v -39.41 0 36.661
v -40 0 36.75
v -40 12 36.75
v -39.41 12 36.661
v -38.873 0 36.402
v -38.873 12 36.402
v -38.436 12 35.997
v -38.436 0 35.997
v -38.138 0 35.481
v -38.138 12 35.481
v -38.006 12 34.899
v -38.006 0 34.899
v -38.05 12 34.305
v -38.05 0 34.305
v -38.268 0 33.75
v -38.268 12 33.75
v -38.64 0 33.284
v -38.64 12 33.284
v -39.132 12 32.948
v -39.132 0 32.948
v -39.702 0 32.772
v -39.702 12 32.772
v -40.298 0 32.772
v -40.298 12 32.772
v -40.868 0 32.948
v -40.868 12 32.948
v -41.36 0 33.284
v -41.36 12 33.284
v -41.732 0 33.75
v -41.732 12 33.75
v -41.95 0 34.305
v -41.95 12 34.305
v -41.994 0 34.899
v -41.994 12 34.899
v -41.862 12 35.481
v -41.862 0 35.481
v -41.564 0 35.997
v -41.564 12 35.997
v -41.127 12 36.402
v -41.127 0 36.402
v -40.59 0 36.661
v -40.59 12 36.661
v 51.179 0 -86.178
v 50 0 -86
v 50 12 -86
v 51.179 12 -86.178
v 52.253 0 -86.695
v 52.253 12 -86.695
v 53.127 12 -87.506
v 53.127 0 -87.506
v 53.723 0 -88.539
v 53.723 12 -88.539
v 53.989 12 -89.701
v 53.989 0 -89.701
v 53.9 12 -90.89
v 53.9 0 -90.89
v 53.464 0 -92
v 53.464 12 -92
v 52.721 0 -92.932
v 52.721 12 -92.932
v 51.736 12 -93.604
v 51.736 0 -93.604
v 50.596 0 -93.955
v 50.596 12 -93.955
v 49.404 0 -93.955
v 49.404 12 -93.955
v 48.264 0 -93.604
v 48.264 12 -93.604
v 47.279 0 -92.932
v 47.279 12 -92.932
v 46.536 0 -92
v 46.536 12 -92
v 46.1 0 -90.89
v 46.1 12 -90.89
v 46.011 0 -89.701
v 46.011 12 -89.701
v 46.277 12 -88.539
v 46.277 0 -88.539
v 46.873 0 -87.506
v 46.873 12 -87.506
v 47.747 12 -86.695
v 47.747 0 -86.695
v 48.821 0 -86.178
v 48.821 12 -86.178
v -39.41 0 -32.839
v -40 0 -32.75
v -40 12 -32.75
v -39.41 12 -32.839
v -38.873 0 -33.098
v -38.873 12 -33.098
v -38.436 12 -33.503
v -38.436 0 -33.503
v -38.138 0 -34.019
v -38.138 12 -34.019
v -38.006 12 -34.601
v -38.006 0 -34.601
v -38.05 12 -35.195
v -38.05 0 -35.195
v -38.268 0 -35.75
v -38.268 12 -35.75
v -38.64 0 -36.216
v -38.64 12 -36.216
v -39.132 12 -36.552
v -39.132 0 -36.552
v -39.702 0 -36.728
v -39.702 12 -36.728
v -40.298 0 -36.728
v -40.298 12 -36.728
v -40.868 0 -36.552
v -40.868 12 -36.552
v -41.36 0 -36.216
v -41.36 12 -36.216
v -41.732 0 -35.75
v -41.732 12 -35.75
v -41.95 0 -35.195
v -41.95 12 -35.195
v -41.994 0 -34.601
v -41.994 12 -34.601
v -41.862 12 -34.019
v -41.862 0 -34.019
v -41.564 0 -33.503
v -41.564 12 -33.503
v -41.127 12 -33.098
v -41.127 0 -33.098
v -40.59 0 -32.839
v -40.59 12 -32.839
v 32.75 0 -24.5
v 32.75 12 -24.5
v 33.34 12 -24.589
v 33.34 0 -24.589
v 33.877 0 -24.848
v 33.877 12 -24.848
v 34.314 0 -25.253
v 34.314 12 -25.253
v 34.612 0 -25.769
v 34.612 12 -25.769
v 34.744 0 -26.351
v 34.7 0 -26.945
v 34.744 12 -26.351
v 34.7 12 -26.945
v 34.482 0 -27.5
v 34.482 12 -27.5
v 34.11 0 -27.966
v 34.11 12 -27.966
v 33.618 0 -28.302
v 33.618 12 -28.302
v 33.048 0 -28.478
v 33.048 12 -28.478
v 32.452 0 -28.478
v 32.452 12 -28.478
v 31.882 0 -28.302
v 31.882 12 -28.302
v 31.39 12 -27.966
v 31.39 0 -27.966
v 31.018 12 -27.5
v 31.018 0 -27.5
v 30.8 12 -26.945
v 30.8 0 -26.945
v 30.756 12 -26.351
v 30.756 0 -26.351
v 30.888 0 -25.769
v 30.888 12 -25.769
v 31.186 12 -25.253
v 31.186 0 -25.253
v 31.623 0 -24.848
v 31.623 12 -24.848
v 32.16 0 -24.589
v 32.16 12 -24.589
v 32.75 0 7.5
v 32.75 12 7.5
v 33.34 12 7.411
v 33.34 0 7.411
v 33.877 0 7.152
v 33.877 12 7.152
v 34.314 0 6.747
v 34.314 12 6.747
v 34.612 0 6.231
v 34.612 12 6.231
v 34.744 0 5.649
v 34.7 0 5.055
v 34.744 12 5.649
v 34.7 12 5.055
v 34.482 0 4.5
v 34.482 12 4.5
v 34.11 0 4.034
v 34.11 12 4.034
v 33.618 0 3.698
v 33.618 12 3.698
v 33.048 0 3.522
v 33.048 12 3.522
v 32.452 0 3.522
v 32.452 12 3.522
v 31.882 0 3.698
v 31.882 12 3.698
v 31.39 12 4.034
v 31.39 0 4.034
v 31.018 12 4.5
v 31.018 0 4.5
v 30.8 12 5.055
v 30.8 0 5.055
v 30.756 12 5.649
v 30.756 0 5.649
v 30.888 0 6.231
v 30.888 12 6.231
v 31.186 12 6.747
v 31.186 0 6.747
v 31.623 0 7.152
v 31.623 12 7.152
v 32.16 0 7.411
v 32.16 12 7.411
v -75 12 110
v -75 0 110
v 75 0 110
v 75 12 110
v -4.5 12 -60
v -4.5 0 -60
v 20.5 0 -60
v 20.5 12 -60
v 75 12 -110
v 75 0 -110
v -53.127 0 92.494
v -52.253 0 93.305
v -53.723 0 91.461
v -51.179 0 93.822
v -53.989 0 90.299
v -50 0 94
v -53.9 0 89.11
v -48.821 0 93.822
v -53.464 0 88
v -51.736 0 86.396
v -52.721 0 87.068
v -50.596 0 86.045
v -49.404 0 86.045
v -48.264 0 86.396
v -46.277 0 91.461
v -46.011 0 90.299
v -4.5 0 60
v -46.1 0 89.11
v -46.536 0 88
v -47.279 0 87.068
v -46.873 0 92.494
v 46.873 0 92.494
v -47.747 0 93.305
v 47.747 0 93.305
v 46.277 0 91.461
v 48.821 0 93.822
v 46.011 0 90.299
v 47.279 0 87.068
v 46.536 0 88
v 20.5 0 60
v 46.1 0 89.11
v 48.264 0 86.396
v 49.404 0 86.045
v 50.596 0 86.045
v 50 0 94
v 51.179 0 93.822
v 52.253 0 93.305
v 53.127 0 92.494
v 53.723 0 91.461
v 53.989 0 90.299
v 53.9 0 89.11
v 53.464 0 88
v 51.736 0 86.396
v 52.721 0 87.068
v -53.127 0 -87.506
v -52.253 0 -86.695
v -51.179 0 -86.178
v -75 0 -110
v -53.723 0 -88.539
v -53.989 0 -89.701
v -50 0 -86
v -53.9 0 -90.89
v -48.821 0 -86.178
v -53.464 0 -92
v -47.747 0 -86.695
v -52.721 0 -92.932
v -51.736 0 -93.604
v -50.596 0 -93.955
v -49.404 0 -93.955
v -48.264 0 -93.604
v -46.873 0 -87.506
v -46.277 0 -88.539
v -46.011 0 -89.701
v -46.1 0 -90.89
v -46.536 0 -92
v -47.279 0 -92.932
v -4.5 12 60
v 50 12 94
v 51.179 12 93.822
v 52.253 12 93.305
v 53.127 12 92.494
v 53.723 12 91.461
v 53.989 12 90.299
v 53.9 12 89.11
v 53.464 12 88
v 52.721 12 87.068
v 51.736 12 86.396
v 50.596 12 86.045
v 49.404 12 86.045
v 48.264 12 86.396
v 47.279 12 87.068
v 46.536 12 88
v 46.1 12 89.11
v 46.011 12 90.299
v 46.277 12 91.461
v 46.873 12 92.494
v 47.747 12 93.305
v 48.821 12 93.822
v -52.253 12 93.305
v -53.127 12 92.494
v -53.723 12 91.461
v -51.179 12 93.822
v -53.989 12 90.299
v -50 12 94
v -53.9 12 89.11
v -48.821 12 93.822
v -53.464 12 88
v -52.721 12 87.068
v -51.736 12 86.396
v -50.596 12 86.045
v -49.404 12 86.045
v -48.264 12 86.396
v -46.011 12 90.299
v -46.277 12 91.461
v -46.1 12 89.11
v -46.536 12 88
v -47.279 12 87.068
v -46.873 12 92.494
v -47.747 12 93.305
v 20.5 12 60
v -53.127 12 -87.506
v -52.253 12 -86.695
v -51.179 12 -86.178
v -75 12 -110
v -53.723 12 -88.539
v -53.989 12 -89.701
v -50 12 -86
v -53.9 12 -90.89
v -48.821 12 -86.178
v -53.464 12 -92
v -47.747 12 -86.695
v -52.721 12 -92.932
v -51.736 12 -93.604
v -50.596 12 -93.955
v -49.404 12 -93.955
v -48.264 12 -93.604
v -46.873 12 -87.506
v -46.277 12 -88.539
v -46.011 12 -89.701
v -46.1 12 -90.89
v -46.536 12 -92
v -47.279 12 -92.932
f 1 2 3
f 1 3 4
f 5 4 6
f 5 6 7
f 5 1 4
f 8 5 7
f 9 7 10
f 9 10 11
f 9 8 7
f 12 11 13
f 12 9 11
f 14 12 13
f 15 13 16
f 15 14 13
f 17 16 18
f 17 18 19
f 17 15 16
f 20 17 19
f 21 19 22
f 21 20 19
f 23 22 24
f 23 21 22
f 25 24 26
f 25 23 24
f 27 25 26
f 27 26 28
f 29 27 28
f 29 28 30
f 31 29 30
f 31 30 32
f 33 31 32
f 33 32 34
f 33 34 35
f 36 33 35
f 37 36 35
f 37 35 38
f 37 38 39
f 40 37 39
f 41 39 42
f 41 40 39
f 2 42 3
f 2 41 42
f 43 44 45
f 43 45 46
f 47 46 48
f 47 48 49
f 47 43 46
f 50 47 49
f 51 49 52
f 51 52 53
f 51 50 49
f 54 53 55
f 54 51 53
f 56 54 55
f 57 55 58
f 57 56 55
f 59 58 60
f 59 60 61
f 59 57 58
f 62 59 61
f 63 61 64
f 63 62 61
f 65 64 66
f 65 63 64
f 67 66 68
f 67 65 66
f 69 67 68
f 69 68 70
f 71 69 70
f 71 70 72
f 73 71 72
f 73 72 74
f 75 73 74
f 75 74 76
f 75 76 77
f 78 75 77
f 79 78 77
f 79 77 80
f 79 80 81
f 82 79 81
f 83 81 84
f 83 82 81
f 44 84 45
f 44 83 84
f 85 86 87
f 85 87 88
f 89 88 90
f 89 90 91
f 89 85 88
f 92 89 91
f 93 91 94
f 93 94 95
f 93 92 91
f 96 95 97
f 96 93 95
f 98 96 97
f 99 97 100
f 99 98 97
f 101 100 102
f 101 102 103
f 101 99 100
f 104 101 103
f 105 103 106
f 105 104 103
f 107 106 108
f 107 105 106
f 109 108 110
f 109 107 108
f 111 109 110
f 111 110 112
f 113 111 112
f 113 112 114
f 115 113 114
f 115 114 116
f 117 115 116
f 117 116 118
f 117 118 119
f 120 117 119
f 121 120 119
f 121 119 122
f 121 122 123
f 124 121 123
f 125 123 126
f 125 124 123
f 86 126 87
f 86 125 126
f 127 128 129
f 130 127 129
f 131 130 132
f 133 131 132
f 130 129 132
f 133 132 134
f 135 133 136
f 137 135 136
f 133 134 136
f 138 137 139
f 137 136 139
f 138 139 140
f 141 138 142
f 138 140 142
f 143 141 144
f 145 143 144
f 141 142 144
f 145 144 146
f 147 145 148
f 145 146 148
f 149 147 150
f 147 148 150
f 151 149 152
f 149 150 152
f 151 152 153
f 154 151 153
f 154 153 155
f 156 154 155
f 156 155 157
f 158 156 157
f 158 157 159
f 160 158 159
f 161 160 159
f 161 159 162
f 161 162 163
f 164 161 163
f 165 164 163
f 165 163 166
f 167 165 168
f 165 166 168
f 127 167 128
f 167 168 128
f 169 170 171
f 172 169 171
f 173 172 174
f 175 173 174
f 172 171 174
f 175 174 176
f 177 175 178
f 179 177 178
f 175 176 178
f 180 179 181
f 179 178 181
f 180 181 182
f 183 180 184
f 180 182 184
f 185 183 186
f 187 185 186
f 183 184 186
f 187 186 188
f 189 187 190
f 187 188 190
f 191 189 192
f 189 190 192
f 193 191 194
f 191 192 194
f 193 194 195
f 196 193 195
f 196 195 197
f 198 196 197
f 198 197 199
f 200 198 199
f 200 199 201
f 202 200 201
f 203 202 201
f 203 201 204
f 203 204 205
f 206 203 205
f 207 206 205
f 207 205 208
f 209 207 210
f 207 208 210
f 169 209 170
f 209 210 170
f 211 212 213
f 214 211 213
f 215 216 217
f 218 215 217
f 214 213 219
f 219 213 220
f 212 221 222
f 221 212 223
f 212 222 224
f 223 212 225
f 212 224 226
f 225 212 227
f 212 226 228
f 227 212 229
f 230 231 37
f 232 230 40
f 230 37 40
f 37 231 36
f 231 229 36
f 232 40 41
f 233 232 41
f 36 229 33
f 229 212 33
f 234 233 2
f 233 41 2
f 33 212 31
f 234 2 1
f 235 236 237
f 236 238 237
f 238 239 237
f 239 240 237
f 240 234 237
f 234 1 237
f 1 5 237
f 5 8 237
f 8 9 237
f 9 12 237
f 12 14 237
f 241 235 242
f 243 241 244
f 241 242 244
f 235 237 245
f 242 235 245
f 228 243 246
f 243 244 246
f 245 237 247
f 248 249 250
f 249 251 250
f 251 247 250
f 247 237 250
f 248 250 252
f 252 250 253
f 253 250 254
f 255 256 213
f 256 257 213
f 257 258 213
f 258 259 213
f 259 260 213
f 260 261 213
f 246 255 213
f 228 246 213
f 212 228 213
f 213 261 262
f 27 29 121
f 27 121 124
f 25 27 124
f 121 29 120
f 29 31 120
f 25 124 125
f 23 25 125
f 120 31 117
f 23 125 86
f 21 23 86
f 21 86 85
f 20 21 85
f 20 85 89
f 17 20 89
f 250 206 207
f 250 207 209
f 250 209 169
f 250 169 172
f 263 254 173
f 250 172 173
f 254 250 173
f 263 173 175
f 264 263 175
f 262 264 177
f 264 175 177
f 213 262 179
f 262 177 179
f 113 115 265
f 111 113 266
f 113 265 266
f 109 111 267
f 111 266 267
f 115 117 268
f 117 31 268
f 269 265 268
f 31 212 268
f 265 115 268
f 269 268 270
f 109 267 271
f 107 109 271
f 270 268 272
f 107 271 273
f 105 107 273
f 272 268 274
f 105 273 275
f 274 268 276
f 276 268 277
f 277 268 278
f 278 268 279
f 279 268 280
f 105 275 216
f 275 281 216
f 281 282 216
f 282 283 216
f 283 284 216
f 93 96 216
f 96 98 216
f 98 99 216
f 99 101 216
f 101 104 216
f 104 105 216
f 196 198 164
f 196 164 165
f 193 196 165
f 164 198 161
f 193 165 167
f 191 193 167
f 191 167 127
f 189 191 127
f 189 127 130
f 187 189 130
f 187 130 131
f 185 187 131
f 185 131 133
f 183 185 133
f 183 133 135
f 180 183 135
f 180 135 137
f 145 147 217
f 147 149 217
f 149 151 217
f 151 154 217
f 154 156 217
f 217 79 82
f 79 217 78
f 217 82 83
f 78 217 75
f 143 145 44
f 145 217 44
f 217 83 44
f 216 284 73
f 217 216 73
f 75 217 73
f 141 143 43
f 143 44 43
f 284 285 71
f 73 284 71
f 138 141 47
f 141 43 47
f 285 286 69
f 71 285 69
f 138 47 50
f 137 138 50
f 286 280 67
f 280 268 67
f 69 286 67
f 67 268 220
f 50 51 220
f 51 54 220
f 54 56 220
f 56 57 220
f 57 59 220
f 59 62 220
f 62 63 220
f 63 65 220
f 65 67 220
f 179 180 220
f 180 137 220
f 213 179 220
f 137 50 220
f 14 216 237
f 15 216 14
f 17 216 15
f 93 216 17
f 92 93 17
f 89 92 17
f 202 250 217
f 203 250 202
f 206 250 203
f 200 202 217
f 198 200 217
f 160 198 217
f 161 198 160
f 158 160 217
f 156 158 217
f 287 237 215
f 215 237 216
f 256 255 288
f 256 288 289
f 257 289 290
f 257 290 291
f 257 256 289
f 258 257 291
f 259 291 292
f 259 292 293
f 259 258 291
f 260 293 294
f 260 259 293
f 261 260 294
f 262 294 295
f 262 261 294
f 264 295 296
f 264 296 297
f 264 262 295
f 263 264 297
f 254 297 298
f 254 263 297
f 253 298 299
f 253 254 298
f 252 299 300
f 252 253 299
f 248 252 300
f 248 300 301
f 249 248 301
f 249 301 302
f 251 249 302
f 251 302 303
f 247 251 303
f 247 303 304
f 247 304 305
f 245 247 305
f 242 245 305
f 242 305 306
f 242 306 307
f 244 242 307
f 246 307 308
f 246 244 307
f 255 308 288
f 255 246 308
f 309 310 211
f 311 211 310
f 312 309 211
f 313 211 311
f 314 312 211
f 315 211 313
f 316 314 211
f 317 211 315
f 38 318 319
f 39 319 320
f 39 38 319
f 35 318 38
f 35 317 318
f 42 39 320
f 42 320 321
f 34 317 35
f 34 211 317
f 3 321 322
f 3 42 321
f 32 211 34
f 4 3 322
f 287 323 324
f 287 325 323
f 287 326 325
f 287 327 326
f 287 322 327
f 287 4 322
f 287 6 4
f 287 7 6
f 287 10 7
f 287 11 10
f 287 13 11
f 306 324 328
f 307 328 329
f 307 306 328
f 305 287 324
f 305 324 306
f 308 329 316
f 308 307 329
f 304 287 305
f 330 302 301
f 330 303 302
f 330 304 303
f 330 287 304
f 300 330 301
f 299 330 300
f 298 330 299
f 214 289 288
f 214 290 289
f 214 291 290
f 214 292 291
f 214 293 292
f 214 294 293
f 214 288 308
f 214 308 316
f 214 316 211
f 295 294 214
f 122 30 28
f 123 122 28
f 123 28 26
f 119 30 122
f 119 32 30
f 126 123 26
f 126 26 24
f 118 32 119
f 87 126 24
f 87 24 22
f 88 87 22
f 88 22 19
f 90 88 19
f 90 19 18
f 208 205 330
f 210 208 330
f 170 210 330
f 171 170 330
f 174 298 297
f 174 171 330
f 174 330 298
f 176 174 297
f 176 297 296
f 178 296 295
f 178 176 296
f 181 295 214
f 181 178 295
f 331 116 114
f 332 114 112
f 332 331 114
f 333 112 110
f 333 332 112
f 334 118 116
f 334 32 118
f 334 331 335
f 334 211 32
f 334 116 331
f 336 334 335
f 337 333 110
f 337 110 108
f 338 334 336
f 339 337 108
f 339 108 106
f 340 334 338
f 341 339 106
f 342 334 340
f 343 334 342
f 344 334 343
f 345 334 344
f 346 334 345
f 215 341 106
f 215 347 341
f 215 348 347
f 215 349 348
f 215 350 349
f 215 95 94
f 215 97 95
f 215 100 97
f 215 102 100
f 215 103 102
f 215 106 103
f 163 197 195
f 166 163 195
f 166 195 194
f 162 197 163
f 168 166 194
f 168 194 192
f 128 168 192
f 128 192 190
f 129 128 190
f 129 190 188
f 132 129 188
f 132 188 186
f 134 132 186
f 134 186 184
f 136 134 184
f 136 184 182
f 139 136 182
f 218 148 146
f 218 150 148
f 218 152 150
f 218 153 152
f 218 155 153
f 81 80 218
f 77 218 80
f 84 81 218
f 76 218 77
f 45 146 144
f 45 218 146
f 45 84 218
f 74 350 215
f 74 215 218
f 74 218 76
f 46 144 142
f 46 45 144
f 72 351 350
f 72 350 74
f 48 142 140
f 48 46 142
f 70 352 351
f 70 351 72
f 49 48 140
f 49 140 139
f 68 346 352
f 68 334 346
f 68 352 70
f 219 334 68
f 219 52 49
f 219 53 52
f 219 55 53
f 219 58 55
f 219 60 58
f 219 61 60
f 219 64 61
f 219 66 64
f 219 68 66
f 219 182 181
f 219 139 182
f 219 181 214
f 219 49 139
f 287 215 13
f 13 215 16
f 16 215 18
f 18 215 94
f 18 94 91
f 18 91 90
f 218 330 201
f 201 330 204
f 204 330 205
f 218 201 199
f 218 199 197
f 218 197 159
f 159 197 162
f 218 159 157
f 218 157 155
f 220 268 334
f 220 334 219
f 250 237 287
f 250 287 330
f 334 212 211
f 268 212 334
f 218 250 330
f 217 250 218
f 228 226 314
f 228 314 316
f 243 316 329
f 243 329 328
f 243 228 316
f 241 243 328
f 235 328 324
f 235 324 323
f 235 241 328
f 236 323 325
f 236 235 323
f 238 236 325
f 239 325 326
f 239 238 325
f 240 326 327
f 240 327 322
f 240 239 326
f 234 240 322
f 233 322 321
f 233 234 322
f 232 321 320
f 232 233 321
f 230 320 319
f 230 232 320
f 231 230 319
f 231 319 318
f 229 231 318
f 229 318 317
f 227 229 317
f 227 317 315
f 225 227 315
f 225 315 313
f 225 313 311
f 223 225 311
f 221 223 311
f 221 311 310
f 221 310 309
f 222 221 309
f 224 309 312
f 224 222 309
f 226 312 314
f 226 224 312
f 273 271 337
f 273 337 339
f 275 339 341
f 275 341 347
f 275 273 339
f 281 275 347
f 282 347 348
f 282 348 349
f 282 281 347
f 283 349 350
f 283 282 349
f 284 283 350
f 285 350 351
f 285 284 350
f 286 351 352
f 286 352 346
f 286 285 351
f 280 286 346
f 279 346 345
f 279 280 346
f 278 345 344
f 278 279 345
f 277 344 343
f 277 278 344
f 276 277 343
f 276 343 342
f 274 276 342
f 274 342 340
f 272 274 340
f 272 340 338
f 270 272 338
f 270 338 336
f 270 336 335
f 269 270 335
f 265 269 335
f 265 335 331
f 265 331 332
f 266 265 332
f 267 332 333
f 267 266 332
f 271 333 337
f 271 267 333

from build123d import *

# Parameters (mm, degrees)
SKETCH1_W           = 150
SKETCH1_H           = 220
SKETCH1_R           = 2
SKETCH1_R_2         = 4
SKETCH1_W_2         = 25
SKETCH1_H_2         = 120
BOSS_EXTRUDE1_DEPTH = 12
SKETCH2_R           = 2
CUT_EXTRUDE1_DEPTH  = 12


with BuildPart() as part:
    # Sketch1 → Boss-Extrude1 (new body)
    with BuildSketch(Plane(origin=(0, 0, 0), x_dir=(1, 0, 0), z_dir=(0, 1, 0))):
        Rectangle(SKETCH1_W, SKETCH1_H)
        with Locations(Location((-40, 34.75, 0), (0, 0, 270))):
            Circle(SKETCH1_R, mode=Mode.SUBTRACT)
        with Locations(Location((-40, -34.75, 0), (0, 0, 270))):
            Circle(SKETCH1_R, mode=Mode.SUBTRACT)
        with Locations(Location((-50, 90, 0), (0, 0, 270))):
            Circle(SKETCH1_R_2, mode=Mode.SUBTRACT)
        with Locations(Location((50, 90, 0), (0, 0, 270))):
            Circle(SKETCH1_R_2, mode=Mode.SUBTRACT)
        with Locations(Location((-50, -90, 0), (0, 0, 270))):
            Circle(SKETCH1_R_2, mode=Mode.SUBTRACT)
        with Locations(Location((50, -90, 0), (0, 0, 270))):
            Circle(SKETCH1_R_2, mode=Mode.SUBTRACT)
        with Locations((8, 0)):
            Rectangle(SKETCH1_W_2, SKETCH1_H_2, mode=Mode.SUBTRACT)
    extrude(amount=BOSS_EXTRUDE1_DEPTH)

    # Sketch2 → Cut-Extrude1 (cut)
    with BuildSketch(Plane(origin=(0, 12, 0), x_dir=(1, 0, 0), z_dir=(0, 1, 0))):
        with Locations(Location((32.75, 26.5, 0), (0, 0, 270))):
            Circle(SKETCH2_R)
        with Locations(Location((32.75, -5.5, 0), (0, 0, 270))):
            Circle(SKETCH2_R)
    extrude(amount=-CUT_EXTRUDE1_DEPTH, mode=Mode.SUBTRACT)


solid = part.part
